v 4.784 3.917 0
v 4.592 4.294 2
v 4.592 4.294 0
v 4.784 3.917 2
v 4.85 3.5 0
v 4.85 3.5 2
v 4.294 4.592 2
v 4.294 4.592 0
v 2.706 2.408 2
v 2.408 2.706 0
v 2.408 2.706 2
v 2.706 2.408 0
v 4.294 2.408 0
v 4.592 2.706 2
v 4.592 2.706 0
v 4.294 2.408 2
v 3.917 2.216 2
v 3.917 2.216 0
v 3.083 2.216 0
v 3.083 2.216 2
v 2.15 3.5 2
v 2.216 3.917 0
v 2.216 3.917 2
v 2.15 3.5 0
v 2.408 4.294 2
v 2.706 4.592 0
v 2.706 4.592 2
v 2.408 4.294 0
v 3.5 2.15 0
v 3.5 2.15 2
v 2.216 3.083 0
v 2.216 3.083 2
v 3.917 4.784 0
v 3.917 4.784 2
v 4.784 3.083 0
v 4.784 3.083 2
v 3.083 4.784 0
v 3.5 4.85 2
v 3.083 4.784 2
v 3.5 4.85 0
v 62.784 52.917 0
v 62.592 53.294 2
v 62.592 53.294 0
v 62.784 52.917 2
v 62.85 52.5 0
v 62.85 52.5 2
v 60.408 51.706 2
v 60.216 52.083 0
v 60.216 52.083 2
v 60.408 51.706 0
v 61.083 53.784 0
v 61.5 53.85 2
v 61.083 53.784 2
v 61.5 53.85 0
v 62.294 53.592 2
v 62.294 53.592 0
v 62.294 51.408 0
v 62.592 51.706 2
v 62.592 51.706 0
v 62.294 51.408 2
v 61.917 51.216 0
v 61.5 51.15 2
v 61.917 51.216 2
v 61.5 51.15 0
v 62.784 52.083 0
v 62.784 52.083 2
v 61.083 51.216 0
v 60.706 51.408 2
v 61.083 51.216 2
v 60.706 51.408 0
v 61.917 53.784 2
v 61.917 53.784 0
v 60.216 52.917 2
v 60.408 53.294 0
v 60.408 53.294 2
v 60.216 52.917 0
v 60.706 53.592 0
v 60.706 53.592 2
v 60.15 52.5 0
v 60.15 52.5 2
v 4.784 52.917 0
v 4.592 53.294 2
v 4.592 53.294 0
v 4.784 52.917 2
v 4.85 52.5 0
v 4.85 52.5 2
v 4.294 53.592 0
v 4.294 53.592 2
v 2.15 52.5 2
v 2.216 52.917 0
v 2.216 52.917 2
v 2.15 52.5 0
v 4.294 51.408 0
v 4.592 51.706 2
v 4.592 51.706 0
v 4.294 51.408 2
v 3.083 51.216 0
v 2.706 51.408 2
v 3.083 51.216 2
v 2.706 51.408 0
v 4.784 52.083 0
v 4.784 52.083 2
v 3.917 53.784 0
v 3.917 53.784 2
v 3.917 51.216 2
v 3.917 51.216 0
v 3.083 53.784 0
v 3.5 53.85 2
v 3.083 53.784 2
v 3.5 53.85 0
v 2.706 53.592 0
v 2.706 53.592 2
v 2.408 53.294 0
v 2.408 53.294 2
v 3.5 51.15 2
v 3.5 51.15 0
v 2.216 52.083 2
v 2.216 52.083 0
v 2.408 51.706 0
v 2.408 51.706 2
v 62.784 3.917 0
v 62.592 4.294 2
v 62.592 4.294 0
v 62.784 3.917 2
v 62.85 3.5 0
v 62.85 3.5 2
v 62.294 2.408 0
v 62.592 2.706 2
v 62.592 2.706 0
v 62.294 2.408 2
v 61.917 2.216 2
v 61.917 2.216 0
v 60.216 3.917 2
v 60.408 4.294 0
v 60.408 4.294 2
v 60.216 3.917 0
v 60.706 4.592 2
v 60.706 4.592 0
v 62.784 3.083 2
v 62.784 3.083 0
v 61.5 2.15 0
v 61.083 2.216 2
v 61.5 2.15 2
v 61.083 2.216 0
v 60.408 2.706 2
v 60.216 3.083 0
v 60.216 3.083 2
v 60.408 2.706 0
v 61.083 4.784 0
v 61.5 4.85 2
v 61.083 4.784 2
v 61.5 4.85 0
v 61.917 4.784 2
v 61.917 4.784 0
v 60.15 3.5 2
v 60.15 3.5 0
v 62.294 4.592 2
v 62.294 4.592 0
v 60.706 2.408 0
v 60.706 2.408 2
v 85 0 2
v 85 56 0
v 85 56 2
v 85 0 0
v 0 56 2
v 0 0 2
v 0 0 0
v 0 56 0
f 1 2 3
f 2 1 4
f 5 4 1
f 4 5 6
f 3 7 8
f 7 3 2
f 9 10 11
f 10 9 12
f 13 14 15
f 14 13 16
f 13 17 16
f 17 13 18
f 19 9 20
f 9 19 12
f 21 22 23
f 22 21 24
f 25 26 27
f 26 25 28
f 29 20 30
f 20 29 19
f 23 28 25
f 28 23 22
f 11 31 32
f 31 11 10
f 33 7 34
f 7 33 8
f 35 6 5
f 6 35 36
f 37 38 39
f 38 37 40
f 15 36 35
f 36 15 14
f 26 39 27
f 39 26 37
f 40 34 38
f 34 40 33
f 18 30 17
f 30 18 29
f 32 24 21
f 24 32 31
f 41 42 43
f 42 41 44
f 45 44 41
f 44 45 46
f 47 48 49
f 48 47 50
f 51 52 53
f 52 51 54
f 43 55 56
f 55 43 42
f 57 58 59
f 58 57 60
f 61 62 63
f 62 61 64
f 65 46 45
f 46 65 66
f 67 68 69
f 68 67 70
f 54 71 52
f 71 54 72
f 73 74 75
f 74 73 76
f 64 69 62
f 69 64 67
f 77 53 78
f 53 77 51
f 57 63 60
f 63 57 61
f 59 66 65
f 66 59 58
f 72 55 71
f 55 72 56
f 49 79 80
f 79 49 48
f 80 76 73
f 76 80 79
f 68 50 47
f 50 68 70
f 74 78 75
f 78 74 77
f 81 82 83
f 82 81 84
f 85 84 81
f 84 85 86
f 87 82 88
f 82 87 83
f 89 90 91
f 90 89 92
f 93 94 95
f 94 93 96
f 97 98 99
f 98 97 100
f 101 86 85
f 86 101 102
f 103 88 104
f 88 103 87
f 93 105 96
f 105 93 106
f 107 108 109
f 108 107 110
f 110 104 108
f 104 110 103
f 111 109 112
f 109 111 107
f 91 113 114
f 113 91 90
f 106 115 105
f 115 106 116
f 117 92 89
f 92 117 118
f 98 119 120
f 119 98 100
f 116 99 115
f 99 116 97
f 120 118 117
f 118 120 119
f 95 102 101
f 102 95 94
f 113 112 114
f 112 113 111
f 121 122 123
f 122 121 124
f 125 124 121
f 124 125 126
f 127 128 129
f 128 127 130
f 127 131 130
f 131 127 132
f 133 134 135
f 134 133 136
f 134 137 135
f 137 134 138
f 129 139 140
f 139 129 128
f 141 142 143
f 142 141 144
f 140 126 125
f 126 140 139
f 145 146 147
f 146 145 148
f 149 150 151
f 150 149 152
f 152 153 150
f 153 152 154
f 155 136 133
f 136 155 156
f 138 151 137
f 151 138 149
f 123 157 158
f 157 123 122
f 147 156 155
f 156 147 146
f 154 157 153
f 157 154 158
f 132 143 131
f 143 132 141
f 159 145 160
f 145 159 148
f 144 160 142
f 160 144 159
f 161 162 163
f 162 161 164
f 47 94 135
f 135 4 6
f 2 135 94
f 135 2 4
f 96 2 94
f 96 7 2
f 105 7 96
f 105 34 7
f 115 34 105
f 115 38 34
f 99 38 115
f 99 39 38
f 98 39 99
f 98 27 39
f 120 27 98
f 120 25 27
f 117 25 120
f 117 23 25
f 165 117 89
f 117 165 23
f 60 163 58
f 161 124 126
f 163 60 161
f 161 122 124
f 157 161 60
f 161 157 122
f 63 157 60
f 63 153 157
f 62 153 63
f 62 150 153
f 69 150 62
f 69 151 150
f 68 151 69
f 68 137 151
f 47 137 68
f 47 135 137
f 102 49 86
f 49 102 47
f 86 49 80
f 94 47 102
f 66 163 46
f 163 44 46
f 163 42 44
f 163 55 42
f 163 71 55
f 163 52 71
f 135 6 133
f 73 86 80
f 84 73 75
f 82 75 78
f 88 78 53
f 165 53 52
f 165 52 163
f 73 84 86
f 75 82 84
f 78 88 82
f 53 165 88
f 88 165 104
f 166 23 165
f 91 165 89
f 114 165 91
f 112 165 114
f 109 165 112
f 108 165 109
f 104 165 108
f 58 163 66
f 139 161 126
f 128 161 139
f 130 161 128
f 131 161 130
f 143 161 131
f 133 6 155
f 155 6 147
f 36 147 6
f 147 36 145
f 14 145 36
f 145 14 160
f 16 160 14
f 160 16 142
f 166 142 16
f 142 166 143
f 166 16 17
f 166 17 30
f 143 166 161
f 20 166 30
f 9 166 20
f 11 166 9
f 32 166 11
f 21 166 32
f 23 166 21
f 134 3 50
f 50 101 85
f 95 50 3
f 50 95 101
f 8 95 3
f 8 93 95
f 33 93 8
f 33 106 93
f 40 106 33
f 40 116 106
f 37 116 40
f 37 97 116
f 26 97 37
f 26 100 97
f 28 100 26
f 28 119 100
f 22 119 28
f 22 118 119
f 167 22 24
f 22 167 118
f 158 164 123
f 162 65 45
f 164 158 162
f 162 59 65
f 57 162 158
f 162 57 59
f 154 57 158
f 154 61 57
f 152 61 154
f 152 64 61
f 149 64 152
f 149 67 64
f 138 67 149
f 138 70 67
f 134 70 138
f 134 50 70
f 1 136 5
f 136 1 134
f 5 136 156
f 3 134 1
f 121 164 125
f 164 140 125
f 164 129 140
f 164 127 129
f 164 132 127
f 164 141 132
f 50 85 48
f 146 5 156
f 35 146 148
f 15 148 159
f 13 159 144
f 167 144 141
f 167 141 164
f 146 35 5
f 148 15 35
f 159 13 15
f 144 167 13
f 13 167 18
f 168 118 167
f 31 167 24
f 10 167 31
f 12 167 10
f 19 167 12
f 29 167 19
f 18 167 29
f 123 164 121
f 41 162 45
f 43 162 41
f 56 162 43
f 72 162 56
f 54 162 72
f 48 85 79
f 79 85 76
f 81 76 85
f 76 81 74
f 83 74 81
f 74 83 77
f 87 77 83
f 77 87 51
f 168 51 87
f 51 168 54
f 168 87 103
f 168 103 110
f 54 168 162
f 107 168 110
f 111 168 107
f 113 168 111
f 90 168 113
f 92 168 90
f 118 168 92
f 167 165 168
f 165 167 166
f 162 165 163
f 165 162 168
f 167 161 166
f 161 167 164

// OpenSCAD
$fn = 20;

BaseBoard();

module BaseBoard() {
	difference() {
		cube([85, 56, 2]);
		Holes(3.5, 3.5);
	}
}

module Holes(bottomLeftX, bottomLeftY) {
	translate([bottomLeftX, bottomLeftY, 0]) {
		Hole(0,0,0);
		Hole(58, 49, 0);
		Hole(0, 49, 0);
		Hole(58, 0, 0);
	}
}

module Hole(x, y, z) {
	translate([x, y, z-5]) {
		cylinder(d=2.7, h=10);
	}
};
